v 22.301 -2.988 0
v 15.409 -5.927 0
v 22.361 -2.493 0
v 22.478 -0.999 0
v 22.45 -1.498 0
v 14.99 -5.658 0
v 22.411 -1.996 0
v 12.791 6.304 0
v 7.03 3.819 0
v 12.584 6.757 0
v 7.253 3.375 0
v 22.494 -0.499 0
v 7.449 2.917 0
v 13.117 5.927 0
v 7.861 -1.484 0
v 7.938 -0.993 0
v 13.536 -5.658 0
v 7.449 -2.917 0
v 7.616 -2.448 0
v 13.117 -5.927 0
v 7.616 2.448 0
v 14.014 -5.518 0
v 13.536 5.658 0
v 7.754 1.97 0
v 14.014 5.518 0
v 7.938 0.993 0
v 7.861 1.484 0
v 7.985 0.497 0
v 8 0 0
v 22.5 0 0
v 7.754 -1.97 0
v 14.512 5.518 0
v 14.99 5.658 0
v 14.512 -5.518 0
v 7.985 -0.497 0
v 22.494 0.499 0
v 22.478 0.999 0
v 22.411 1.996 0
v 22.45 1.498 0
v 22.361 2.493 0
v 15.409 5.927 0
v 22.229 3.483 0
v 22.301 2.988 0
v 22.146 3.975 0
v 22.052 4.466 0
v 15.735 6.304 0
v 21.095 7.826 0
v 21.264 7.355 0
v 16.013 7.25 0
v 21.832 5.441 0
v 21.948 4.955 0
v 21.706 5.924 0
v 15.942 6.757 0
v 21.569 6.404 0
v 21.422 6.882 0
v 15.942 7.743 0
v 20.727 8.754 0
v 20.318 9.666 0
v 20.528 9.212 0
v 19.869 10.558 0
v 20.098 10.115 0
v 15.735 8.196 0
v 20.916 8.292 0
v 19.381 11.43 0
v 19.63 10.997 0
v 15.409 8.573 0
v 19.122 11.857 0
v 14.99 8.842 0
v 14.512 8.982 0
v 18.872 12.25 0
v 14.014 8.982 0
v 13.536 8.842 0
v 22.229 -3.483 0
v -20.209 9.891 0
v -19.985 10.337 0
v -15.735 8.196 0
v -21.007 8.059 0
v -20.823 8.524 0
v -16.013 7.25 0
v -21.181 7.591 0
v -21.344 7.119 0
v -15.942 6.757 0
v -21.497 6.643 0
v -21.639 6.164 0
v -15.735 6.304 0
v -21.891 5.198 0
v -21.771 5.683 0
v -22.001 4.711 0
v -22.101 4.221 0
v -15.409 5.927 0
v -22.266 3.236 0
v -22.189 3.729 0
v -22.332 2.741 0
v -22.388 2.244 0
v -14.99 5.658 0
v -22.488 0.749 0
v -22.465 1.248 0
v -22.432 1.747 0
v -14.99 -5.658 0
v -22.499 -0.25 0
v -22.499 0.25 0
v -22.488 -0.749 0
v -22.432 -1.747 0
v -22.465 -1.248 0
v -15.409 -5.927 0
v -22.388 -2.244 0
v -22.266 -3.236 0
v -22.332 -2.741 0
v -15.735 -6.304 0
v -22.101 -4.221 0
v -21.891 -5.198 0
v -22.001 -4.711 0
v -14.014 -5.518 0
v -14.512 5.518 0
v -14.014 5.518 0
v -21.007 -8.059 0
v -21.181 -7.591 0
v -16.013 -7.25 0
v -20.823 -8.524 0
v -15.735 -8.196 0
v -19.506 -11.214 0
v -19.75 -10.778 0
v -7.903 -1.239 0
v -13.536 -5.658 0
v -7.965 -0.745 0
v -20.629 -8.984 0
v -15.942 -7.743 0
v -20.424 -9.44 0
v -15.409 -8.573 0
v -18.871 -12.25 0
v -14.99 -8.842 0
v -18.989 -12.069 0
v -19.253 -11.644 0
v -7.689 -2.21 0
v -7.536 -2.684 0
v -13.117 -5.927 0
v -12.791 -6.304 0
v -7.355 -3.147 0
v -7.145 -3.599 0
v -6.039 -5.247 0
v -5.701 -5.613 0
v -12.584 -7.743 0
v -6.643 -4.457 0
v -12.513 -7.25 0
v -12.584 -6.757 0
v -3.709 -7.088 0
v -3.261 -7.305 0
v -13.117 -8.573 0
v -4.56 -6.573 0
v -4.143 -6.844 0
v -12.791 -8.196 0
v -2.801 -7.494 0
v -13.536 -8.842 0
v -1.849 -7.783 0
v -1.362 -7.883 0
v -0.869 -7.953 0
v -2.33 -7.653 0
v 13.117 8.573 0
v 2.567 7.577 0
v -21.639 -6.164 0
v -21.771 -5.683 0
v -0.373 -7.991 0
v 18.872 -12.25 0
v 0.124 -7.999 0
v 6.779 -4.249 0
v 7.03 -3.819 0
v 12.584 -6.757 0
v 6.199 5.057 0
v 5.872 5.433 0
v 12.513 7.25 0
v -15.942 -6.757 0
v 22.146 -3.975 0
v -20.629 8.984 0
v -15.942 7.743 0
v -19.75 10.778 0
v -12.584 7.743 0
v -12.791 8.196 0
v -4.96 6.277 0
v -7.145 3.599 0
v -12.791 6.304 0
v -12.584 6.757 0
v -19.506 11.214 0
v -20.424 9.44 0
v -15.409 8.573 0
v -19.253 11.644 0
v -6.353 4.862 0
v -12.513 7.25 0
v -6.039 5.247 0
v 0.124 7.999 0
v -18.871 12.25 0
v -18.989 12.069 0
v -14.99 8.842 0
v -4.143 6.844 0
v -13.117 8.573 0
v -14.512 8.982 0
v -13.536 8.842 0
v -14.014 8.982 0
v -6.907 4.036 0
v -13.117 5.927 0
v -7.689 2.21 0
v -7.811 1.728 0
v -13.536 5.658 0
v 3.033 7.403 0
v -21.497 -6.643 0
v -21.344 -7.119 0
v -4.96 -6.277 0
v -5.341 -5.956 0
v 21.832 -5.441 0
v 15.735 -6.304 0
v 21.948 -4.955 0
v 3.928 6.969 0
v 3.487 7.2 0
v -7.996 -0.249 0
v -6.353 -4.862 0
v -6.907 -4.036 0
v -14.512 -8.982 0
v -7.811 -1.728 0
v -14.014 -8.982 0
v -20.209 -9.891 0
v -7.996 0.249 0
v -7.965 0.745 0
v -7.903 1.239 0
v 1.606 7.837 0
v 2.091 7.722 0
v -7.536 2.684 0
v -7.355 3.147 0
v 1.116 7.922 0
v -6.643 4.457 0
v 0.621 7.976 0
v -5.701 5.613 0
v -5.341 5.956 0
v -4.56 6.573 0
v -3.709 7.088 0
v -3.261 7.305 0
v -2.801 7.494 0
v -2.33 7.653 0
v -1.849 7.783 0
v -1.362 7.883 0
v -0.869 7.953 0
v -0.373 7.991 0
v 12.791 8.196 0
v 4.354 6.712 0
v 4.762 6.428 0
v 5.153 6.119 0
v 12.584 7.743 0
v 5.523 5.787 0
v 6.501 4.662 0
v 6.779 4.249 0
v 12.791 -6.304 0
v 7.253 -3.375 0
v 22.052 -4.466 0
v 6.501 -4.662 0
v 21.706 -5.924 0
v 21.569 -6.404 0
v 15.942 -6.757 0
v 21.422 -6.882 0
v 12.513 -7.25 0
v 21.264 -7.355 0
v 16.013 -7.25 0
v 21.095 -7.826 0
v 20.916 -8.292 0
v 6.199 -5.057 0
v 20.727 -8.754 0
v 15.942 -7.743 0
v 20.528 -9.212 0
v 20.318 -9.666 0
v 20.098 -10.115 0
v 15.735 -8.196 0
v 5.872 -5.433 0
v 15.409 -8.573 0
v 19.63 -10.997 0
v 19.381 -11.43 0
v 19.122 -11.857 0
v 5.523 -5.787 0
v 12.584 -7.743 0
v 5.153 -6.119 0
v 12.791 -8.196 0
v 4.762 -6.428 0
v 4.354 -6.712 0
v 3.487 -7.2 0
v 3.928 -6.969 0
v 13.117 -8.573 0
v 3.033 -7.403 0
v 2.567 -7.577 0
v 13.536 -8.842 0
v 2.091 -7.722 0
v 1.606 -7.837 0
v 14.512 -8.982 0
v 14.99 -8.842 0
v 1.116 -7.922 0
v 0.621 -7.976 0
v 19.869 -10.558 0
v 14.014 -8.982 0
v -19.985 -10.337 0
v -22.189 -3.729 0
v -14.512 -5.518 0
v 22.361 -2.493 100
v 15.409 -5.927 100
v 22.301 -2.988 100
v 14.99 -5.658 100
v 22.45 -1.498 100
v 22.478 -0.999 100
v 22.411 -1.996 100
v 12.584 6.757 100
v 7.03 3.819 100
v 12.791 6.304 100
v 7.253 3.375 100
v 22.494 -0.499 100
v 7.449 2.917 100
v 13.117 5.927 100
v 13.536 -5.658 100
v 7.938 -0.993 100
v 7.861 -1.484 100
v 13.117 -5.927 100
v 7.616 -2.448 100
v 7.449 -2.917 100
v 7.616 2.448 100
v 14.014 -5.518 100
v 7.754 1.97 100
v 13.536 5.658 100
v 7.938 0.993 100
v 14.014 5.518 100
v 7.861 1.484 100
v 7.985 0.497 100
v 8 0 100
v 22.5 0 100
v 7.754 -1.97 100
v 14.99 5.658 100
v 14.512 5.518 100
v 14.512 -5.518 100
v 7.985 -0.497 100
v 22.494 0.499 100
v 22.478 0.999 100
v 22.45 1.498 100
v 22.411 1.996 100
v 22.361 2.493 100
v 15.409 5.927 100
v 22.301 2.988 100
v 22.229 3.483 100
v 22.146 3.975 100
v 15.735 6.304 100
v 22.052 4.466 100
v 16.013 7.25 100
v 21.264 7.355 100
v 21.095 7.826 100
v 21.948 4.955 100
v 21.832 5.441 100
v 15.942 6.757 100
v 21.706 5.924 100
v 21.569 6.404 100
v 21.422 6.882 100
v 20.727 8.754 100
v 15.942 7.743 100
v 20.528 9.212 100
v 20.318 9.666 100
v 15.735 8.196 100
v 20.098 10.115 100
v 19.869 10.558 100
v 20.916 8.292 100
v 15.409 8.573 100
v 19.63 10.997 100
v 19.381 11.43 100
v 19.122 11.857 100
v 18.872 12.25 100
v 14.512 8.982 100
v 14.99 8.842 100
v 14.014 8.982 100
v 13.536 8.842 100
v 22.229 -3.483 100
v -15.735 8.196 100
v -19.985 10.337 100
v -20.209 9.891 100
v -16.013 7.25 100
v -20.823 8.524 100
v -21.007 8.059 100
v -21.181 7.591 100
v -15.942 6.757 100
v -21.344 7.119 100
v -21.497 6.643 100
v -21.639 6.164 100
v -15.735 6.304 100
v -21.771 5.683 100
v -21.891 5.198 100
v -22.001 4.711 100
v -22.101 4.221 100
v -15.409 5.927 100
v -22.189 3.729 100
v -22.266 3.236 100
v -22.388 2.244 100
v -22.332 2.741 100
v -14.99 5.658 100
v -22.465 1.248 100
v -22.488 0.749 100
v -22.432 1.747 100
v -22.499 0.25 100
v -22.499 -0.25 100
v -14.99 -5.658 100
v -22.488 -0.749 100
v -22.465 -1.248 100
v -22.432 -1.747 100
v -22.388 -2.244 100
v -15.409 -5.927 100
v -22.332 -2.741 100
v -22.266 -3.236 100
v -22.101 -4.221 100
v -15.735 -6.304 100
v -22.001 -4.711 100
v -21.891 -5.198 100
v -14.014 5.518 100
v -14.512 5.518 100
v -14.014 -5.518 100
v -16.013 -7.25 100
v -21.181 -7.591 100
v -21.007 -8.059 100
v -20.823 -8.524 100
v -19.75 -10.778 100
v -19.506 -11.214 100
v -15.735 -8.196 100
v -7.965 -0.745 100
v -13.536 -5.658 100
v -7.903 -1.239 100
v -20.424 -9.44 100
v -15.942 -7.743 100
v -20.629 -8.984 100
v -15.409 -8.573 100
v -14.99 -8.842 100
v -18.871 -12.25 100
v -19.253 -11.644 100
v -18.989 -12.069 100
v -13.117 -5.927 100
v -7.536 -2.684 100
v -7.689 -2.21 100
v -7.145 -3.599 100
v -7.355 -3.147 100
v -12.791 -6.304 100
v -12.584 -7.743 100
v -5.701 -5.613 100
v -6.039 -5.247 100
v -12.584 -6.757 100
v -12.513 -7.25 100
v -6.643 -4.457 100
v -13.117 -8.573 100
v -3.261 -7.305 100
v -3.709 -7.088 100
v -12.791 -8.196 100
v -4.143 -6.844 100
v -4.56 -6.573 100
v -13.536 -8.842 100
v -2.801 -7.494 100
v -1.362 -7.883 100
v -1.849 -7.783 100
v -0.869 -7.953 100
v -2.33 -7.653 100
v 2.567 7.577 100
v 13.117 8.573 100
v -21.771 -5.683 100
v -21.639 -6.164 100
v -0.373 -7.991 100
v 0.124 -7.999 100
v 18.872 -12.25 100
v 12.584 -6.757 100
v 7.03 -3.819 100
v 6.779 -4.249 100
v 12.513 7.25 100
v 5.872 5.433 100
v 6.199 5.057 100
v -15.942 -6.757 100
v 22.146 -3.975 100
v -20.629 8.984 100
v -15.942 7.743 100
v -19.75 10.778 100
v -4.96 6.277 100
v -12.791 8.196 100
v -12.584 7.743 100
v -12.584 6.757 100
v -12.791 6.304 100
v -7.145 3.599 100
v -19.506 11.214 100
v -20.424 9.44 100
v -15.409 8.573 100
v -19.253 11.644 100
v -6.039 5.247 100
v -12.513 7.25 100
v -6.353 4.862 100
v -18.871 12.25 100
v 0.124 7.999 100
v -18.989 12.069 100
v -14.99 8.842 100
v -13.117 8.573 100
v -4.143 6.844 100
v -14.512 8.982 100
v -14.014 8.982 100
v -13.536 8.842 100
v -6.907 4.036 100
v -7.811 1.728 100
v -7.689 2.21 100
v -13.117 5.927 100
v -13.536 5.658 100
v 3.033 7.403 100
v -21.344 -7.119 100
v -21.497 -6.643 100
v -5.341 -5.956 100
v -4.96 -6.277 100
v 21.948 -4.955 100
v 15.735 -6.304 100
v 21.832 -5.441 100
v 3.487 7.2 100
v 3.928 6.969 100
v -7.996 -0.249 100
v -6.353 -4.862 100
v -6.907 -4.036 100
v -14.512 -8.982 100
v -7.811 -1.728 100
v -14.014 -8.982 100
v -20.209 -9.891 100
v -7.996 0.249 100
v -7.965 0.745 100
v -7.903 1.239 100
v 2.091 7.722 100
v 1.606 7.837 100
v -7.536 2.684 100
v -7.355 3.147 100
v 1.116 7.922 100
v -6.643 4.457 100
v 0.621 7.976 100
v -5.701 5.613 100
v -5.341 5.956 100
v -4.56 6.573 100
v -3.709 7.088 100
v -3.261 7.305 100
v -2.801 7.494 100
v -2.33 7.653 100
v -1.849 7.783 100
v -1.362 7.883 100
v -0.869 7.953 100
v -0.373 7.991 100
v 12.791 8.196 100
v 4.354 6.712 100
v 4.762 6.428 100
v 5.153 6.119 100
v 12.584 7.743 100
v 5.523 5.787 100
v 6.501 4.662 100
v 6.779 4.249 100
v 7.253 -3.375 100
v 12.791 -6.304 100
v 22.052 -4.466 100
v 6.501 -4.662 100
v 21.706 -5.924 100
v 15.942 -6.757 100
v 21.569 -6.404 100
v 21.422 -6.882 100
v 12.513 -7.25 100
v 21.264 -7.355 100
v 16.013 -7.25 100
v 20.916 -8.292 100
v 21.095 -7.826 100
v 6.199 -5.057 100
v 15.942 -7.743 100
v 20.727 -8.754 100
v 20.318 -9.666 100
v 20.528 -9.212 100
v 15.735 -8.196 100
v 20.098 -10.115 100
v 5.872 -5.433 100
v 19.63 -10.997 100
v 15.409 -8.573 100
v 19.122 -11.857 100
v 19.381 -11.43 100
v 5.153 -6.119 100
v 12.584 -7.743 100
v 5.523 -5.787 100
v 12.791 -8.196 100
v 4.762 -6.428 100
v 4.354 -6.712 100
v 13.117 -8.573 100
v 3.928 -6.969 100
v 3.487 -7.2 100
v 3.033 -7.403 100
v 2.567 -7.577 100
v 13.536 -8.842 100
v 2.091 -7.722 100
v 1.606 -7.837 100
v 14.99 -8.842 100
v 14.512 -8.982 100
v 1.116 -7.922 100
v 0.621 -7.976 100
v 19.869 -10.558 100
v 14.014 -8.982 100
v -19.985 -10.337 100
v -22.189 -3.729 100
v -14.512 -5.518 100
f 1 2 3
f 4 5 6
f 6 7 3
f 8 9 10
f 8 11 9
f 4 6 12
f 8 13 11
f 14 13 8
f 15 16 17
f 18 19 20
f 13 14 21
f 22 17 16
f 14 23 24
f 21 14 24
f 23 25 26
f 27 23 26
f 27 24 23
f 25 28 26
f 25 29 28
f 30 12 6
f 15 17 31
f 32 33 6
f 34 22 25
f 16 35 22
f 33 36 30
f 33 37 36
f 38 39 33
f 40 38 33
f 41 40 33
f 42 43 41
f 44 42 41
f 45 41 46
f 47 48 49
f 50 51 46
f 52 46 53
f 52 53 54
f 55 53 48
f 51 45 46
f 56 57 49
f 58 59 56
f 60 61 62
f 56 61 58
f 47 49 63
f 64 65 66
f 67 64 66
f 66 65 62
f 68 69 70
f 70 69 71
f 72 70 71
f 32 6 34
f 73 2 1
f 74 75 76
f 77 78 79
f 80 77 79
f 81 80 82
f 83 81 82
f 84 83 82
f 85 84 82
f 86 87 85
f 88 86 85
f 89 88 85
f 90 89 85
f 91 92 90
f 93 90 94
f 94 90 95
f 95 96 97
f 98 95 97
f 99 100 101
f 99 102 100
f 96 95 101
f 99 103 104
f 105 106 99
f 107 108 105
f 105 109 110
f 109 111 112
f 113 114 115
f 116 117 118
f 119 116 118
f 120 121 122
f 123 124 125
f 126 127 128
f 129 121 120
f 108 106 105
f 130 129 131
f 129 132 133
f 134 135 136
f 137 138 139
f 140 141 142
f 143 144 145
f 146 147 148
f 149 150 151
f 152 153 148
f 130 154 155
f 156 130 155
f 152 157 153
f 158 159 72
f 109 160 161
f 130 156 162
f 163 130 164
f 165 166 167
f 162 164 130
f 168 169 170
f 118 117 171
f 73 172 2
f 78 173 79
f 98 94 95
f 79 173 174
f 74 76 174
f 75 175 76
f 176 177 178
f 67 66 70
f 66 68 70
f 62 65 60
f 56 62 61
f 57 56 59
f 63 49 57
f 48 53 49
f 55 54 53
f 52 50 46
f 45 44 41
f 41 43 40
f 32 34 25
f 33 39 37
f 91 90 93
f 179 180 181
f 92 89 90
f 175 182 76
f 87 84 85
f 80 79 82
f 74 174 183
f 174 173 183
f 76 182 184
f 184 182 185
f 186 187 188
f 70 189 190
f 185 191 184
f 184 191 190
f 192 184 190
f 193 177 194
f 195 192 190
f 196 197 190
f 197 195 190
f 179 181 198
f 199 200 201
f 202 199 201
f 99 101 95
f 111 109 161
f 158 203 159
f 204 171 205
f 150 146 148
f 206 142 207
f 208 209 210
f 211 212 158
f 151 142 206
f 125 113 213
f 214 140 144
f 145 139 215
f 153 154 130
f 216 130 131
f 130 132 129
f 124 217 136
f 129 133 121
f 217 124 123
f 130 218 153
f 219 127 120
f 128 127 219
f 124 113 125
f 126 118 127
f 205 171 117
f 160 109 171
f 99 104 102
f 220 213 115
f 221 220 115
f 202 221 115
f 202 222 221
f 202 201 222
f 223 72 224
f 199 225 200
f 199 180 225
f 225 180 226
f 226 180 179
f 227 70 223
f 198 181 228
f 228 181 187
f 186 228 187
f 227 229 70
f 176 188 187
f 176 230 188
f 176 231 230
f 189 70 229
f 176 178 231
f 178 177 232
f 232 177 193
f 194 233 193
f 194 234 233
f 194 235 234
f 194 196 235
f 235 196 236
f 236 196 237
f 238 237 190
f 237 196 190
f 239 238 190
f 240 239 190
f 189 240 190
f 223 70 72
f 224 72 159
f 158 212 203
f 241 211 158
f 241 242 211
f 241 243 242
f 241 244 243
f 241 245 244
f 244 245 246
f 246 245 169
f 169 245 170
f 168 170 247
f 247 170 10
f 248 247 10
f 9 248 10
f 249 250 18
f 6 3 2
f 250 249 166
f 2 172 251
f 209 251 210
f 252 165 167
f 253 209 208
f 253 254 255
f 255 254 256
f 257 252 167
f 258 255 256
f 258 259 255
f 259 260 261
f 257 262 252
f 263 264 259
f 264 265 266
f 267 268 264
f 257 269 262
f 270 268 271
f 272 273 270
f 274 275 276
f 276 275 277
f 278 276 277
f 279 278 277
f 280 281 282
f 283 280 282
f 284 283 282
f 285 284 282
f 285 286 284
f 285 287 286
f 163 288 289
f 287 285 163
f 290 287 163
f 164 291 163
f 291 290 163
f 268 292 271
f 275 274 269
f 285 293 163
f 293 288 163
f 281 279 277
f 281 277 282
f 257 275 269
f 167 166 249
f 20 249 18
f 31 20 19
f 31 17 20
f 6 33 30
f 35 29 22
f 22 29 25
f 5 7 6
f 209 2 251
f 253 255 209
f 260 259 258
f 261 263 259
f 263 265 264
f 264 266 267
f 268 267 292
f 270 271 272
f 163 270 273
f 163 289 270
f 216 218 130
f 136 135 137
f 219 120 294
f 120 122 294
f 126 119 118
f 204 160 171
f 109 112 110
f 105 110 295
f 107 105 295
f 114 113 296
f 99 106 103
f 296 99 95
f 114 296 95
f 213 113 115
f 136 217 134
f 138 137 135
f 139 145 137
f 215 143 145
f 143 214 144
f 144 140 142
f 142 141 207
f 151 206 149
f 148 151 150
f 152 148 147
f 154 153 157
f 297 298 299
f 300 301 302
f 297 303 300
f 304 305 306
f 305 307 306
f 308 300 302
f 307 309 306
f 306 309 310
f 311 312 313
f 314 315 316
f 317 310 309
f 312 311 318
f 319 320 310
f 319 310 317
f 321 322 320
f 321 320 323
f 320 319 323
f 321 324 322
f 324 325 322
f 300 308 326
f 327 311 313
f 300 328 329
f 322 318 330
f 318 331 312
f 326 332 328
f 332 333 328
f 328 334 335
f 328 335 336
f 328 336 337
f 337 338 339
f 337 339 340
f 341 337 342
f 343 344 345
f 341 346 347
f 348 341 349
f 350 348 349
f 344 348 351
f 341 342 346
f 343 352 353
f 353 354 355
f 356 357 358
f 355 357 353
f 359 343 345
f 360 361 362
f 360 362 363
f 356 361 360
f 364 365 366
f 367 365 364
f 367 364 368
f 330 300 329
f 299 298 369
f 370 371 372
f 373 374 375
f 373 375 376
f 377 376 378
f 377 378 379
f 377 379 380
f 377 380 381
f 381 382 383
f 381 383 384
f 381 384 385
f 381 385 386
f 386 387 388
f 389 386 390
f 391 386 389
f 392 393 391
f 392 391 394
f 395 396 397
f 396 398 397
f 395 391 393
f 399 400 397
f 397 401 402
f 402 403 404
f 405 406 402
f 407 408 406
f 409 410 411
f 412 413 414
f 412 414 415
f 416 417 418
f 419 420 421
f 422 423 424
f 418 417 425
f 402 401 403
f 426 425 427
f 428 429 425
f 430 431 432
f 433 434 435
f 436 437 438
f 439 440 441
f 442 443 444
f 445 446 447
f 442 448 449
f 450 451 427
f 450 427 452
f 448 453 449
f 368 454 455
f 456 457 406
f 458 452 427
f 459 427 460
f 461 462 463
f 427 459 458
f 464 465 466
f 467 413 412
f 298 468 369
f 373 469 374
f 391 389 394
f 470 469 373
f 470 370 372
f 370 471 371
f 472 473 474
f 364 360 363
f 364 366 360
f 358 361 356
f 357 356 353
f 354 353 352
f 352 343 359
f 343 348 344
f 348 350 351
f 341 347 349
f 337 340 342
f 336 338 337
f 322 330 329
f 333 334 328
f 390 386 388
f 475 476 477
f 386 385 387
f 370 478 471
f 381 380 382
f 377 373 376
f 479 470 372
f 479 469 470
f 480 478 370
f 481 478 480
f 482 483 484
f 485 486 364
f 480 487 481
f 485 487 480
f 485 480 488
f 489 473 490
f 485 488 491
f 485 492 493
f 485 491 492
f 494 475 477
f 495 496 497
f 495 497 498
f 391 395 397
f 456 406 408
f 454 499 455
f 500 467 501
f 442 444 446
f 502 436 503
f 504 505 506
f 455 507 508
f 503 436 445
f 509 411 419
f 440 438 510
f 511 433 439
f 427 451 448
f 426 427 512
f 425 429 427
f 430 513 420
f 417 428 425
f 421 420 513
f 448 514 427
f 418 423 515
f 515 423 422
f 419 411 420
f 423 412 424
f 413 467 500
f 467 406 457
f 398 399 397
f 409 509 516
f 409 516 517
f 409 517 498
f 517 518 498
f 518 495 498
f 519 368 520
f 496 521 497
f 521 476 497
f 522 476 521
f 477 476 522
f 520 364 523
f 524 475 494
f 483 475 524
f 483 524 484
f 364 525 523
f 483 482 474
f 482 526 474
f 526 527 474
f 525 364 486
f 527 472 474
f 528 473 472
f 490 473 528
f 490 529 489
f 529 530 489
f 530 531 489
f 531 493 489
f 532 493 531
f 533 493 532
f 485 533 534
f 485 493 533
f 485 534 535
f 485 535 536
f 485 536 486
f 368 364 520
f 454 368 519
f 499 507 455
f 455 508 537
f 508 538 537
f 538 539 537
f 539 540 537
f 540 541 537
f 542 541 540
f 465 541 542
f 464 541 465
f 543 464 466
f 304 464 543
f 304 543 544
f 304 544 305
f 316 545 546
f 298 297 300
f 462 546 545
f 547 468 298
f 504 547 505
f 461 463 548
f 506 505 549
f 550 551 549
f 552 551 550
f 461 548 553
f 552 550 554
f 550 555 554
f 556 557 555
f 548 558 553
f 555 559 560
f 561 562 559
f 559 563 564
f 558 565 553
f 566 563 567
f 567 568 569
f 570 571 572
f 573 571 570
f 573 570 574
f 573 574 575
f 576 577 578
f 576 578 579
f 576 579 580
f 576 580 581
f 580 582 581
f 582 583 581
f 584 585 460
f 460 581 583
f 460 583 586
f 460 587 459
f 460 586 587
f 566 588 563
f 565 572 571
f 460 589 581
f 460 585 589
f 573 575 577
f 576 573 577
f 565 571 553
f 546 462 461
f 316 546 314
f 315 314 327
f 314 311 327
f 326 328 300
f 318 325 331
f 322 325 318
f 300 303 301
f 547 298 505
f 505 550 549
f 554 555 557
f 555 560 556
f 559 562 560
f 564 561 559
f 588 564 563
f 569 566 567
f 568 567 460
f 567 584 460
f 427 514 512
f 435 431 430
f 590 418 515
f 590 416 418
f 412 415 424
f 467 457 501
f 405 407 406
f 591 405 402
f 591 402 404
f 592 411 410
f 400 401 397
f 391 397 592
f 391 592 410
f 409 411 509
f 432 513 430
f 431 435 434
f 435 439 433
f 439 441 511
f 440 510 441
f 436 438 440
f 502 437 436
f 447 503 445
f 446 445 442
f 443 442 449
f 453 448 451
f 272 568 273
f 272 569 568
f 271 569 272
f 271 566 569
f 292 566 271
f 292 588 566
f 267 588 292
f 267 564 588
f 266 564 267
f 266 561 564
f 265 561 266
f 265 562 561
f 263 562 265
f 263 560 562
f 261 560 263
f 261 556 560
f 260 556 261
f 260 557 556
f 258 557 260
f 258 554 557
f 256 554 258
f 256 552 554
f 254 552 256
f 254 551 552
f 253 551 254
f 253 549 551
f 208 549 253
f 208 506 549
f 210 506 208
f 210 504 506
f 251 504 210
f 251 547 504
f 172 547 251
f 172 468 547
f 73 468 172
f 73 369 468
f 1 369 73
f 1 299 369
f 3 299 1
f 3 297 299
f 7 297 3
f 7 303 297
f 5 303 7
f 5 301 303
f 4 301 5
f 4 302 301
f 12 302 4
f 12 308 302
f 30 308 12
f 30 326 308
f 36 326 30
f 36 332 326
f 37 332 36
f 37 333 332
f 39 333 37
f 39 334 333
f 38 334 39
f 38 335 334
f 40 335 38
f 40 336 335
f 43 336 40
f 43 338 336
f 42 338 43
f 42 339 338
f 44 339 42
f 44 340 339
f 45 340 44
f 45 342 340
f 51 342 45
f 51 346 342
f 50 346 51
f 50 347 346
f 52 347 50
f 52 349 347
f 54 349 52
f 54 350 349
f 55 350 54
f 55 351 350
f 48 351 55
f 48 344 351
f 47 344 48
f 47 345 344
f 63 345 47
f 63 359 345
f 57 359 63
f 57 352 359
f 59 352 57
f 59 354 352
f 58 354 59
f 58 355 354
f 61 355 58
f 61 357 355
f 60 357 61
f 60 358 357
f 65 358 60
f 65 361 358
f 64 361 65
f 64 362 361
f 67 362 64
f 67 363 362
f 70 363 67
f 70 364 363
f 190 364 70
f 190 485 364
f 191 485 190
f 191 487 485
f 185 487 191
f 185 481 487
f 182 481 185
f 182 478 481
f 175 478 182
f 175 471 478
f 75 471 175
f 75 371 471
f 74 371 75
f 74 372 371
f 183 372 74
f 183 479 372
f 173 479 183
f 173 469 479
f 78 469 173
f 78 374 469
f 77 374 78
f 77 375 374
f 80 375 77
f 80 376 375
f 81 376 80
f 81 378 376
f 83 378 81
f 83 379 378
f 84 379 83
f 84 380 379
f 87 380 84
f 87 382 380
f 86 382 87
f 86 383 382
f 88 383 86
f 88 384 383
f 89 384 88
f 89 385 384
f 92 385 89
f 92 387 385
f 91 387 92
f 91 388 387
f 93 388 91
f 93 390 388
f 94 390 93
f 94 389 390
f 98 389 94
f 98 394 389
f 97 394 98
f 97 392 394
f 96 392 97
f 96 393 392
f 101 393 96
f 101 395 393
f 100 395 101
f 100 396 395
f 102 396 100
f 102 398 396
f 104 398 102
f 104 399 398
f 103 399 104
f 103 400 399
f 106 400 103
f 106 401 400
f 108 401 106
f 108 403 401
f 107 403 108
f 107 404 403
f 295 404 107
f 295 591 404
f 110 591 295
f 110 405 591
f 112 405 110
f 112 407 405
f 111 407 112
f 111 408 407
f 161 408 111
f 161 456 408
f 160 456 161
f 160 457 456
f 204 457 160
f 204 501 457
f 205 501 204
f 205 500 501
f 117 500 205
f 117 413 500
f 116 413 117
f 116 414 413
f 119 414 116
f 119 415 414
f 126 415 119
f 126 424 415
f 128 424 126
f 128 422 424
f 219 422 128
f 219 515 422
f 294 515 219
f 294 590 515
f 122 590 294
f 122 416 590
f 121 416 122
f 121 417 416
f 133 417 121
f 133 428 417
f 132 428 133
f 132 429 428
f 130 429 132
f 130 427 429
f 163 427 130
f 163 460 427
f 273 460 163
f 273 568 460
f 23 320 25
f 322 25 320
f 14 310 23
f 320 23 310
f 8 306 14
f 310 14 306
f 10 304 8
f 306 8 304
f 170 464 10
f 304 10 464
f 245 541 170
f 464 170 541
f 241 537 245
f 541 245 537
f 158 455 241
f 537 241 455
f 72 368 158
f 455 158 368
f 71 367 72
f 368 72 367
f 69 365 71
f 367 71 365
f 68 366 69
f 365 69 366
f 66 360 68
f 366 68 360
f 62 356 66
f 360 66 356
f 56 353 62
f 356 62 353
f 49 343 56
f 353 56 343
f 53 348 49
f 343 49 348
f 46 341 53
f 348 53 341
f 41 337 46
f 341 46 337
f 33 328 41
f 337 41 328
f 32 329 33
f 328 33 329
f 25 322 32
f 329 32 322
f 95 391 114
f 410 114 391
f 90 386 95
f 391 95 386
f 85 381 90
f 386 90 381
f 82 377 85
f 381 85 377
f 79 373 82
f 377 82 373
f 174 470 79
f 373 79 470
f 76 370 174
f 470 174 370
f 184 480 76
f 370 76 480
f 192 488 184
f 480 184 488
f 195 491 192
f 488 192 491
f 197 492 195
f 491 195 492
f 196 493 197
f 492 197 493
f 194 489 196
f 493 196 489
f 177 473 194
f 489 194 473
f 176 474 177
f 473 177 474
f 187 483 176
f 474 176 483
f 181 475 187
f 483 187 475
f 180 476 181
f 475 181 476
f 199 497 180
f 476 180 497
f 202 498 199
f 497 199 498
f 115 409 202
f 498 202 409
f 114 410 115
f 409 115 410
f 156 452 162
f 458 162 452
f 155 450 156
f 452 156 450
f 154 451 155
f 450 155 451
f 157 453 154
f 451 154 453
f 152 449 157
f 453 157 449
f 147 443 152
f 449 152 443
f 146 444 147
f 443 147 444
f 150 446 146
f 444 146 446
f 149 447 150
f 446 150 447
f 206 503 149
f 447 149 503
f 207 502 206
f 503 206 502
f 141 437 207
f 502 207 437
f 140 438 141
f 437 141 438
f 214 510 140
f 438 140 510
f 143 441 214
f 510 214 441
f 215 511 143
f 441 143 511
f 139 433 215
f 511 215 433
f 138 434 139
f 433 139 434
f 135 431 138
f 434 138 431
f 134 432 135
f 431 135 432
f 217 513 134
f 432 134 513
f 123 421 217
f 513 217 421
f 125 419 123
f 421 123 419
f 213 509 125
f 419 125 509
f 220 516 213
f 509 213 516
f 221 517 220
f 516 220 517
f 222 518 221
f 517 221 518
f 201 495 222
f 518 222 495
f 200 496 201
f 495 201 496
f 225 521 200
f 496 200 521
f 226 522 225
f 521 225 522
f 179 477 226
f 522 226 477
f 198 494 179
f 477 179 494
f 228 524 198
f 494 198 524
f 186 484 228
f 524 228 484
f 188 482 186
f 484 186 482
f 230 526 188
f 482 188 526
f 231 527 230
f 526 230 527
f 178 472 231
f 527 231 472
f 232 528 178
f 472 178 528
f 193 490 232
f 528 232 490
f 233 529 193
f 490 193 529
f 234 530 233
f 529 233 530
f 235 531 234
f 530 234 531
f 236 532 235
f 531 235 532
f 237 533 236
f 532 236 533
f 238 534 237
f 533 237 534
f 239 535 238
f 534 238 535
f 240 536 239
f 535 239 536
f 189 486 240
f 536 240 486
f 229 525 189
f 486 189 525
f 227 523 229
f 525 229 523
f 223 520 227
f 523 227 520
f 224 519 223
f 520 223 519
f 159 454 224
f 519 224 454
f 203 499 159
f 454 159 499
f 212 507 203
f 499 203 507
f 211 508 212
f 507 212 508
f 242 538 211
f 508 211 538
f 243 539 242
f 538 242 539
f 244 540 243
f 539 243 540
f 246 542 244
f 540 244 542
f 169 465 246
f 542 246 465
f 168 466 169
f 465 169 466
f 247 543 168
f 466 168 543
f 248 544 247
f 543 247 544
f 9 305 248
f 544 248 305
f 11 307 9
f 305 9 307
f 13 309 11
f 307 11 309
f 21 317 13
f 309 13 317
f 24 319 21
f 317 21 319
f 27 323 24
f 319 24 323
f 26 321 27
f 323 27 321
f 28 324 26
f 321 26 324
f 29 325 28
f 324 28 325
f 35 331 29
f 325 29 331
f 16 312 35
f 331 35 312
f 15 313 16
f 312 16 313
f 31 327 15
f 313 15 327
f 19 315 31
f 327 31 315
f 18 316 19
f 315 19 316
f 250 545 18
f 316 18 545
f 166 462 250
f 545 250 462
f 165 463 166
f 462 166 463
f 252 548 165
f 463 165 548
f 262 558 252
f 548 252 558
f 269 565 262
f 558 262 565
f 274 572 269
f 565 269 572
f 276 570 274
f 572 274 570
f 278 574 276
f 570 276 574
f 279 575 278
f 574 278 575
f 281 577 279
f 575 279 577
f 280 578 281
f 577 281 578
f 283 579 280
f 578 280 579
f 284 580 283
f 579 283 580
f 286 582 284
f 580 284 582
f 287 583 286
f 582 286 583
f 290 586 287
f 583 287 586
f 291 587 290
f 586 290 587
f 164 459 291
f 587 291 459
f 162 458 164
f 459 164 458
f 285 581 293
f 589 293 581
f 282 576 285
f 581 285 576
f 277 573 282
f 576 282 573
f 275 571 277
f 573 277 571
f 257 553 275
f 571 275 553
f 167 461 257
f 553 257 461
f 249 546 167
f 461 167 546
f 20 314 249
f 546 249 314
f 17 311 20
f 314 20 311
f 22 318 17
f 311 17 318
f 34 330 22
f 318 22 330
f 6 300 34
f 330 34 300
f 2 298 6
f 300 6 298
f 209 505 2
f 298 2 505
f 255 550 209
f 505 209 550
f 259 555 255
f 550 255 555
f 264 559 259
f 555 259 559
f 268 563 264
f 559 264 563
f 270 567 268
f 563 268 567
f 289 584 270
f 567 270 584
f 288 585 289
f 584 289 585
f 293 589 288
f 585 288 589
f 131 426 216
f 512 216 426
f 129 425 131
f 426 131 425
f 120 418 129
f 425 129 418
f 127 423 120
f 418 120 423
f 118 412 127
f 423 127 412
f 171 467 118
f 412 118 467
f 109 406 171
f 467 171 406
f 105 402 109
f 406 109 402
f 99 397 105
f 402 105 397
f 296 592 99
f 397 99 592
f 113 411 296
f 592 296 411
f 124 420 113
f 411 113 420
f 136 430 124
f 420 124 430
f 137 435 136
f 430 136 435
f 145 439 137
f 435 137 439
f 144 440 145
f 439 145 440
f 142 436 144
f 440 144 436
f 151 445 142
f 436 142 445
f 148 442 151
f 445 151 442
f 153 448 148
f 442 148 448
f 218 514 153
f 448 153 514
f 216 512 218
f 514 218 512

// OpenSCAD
distance = 32;

y_distance = 14.5;
x_distance = sqrt(distance*distance - y_distance*y_distance);

$fa = 1;
$fs = 0.5;

linear_extrude()
difference() {
circle(d = 45);

translate([x_distance/2, y_distance/2])
circle(d = 3.5);

translate([x_distance/2, -y_distance/2])
circle(d = 3.5);

translate([-x_distance/2, y_distance/2])
circle(d = 3.5);

translate([-x_distance/2, -y_distance/2])
circle(d = 3.5);
    
translate([-45/2,y_distance/2 + 5])
square([45, 45]);
    
translate([-45/2,-y_distance/2 - 5 - 45])
square([45, 45]);
    
circle(d = 16);
    
}
